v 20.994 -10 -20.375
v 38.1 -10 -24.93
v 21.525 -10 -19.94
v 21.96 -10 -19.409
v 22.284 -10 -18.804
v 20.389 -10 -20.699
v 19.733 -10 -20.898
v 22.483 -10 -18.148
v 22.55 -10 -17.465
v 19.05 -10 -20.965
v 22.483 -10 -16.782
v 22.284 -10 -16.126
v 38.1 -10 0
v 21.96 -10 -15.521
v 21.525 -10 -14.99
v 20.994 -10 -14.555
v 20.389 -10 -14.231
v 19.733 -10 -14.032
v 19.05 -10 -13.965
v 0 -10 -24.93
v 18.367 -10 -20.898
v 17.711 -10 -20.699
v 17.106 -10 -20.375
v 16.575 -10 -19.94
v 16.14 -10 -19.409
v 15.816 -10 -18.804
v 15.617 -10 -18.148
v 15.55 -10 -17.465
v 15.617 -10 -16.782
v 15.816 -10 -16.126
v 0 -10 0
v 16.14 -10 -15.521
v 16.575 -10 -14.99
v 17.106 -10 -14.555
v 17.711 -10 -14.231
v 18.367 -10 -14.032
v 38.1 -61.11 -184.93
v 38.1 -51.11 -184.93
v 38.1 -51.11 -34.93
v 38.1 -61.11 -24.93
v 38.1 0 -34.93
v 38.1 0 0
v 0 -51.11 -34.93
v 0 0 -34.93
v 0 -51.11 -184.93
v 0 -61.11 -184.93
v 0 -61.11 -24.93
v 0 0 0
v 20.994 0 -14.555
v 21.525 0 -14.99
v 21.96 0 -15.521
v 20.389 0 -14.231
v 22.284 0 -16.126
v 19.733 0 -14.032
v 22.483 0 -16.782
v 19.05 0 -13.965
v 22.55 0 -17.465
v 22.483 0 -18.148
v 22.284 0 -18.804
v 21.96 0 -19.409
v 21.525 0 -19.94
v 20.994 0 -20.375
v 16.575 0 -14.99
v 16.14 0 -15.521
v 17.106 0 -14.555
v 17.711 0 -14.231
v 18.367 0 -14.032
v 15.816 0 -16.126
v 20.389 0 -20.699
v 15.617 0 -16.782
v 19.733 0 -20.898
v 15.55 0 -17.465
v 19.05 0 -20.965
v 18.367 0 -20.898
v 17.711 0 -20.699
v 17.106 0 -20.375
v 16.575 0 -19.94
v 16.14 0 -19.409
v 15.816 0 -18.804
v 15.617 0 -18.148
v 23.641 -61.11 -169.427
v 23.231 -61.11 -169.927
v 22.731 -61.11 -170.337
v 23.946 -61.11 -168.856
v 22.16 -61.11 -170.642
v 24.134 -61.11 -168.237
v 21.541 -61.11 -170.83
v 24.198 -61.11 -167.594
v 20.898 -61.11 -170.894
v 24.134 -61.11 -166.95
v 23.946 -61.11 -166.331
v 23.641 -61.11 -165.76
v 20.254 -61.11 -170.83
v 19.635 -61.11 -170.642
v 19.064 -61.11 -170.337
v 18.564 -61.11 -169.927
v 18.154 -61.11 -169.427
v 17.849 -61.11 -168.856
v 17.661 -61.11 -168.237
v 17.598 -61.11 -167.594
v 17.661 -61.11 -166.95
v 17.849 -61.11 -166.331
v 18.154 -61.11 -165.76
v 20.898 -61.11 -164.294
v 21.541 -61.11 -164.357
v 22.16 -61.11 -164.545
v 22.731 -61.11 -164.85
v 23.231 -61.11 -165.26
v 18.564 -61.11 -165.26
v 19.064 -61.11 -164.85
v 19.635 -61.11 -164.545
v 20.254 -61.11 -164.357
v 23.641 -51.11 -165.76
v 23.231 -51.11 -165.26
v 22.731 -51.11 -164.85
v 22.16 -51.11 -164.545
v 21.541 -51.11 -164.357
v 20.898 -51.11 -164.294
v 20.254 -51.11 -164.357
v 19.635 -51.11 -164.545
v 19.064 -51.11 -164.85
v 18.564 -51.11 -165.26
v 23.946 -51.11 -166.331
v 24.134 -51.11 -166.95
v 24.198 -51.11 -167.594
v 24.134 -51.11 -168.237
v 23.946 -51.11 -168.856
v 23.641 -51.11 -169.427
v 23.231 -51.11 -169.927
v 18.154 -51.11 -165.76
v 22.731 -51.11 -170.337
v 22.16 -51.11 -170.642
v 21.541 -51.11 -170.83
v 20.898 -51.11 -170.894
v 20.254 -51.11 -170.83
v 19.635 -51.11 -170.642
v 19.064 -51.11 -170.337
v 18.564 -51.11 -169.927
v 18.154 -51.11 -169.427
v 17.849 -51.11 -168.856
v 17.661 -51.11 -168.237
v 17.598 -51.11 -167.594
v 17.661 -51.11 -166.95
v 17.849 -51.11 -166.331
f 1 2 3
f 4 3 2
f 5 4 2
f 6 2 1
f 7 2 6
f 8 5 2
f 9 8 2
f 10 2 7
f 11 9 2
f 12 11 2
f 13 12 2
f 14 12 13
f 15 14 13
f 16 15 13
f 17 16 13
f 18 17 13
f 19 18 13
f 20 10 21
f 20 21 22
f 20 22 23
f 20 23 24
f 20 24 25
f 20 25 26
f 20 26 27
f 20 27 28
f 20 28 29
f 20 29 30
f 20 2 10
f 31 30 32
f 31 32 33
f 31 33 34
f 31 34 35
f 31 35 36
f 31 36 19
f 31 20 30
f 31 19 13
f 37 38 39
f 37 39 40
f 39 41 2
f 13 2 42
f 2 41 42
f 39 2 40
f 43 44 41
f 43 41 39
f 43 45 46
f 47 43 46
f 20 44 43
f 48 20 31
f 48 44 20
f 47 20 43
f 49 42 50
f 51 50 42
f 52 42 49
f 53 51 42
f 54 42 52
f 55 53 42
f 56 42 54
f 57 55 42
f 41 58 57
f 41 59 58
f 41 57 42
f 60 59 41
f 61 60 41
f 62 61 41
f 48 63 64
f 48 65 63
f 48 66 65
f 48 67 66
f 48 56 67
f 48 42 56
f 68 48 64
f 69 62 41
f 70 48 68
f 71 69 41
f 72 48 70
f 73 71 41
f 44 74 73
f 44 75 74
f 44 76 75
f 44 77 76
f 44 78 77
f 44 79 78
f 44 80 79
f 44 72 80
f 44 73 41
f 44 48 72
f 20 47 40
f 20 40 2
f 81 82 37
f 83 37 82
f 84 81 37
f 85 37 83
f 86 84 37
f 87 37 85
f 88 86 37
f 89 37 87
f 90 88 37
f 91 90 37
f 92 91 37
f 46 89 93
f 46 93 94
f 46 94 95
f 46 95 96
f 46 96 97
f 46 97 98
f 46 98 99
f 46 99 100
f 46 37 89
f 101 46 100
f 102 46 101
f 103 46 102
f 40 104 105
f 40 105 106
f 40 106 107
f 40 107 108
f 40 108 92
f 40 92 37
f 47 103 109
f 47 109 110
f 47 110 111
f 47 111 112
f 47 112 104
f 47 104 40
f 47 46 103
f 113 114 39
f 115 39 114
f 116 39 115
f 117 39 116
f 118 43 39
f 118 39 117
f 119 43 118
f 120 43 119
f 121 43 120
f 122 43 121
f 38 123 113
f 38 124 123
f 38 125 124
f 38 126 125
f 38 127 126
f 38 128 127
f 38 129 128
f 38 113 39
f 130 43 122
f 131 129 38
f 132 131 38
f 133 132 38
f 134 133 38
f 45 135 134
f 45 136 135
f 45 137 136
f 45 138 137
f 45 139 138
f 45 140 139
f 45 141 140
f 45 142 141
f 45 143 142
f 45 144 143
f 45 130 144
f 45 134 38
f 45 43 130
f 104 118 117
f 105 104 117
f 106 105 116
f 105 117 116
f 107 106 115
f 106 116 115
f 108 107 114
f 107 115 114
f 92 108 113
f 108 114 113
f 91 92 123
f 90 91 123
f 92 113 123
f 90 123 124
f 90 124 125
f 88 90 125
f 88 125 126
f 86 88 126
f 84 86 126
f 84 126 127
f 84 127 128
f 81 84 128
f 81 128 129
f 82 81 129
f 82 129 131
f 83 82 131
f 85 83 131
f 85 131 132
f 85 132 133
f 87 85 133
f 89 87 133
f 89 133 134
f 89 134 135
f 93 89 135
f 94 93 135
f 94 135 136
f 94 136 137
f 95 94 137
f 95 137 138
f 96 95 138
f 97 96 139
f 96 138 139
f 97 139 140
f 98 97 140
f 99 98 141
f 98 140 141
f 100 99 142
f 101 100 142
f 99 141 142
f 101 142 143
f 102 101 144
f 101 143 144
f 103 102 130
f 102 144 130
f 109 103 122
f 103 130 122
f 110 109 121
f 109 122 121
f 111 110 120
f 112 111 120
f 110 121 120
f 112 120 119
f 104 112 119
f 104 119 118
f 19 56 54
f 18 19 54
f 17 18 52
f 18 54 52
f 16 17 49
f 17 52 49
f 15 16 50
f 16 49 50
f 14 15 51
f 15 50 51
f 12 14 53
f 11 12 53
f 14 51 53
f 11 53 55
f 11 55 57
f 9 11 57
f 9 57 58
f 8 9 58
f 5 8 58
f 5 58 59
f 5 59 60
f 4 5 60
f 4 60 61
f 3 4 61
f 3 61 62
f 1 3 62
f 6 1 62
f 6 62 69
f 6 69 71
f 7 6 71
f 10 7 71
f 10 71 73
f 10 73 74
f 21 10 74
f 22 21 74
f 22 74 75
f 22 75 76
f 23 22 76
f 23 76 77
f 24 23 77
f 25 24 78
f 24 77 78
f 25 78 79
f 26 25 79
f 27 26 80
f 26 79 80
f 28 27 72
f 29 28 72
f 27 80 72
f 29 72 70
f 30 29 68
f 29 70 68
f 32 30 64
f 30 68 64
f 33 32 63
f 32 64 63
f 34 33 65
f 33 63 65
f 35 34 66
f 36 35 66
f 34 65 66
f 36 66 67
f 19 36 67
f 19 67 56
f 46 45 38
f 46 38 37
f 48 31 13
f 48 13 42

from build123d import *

# Parameters (mm, degrees)
EXTRUDE_THIN1_DEPTH = 38.1
SKETCH2_R           = 3.5
CUT_EXTRUDE1_DEPTH  = 199.45691472
SKETCH4_R           = 3.3
CUT_EXTRUDE3_DEPTH  = 60


with BuildPart() as part:
    # Sketch1 → Extrude-Thin1 (new body)
    with BuildSketch(Plane(origin=(0, 0, 0), x_dir=(0, 0, -1), z_dir=(1, 0, 0))):
        Polygon((0, 0), (34.93, 0), (34.93, -51.11), (184.93, -51.11), (184.93, -61.11), (24.93, -61.11), (24.93, -10), (0, -10), align=None)
    extrude(amount=EXTRUDE_THIN1_DEPTH)

    # Sketch2 → Cut-Extrude1 (cut, through all)
    with BuildSketch(Plane(origin=(0, 0, 0), x_dir=(1, 0, 0), z_dir=(0, 1, 0))):
        with Locations(Location((19.05, 17.465, 0), (0, 0, 270))):
            Circle(SKETCH2_R)
    extrude(amount=-CUT_EXTRUDE1_DEPTH, mode=Mode.SUBTRACT)

    # Sketch4 → Cut-Extrude3 (cut)
    with BuildSketch(Plane(origin=(0, -51.11, 0), x_dir=(1, 0, 0), z_dir=(0, 1, 0))):
        with Locations(Location((20.897590421, 167.59354, 0), (0, 0, 270))):
            Circle(SKETCH4_R)
    extrude(amount=-CUT_EXTRUDE3_DEPTH, mode=Mode.SUBTRACT)


solid = part.part
